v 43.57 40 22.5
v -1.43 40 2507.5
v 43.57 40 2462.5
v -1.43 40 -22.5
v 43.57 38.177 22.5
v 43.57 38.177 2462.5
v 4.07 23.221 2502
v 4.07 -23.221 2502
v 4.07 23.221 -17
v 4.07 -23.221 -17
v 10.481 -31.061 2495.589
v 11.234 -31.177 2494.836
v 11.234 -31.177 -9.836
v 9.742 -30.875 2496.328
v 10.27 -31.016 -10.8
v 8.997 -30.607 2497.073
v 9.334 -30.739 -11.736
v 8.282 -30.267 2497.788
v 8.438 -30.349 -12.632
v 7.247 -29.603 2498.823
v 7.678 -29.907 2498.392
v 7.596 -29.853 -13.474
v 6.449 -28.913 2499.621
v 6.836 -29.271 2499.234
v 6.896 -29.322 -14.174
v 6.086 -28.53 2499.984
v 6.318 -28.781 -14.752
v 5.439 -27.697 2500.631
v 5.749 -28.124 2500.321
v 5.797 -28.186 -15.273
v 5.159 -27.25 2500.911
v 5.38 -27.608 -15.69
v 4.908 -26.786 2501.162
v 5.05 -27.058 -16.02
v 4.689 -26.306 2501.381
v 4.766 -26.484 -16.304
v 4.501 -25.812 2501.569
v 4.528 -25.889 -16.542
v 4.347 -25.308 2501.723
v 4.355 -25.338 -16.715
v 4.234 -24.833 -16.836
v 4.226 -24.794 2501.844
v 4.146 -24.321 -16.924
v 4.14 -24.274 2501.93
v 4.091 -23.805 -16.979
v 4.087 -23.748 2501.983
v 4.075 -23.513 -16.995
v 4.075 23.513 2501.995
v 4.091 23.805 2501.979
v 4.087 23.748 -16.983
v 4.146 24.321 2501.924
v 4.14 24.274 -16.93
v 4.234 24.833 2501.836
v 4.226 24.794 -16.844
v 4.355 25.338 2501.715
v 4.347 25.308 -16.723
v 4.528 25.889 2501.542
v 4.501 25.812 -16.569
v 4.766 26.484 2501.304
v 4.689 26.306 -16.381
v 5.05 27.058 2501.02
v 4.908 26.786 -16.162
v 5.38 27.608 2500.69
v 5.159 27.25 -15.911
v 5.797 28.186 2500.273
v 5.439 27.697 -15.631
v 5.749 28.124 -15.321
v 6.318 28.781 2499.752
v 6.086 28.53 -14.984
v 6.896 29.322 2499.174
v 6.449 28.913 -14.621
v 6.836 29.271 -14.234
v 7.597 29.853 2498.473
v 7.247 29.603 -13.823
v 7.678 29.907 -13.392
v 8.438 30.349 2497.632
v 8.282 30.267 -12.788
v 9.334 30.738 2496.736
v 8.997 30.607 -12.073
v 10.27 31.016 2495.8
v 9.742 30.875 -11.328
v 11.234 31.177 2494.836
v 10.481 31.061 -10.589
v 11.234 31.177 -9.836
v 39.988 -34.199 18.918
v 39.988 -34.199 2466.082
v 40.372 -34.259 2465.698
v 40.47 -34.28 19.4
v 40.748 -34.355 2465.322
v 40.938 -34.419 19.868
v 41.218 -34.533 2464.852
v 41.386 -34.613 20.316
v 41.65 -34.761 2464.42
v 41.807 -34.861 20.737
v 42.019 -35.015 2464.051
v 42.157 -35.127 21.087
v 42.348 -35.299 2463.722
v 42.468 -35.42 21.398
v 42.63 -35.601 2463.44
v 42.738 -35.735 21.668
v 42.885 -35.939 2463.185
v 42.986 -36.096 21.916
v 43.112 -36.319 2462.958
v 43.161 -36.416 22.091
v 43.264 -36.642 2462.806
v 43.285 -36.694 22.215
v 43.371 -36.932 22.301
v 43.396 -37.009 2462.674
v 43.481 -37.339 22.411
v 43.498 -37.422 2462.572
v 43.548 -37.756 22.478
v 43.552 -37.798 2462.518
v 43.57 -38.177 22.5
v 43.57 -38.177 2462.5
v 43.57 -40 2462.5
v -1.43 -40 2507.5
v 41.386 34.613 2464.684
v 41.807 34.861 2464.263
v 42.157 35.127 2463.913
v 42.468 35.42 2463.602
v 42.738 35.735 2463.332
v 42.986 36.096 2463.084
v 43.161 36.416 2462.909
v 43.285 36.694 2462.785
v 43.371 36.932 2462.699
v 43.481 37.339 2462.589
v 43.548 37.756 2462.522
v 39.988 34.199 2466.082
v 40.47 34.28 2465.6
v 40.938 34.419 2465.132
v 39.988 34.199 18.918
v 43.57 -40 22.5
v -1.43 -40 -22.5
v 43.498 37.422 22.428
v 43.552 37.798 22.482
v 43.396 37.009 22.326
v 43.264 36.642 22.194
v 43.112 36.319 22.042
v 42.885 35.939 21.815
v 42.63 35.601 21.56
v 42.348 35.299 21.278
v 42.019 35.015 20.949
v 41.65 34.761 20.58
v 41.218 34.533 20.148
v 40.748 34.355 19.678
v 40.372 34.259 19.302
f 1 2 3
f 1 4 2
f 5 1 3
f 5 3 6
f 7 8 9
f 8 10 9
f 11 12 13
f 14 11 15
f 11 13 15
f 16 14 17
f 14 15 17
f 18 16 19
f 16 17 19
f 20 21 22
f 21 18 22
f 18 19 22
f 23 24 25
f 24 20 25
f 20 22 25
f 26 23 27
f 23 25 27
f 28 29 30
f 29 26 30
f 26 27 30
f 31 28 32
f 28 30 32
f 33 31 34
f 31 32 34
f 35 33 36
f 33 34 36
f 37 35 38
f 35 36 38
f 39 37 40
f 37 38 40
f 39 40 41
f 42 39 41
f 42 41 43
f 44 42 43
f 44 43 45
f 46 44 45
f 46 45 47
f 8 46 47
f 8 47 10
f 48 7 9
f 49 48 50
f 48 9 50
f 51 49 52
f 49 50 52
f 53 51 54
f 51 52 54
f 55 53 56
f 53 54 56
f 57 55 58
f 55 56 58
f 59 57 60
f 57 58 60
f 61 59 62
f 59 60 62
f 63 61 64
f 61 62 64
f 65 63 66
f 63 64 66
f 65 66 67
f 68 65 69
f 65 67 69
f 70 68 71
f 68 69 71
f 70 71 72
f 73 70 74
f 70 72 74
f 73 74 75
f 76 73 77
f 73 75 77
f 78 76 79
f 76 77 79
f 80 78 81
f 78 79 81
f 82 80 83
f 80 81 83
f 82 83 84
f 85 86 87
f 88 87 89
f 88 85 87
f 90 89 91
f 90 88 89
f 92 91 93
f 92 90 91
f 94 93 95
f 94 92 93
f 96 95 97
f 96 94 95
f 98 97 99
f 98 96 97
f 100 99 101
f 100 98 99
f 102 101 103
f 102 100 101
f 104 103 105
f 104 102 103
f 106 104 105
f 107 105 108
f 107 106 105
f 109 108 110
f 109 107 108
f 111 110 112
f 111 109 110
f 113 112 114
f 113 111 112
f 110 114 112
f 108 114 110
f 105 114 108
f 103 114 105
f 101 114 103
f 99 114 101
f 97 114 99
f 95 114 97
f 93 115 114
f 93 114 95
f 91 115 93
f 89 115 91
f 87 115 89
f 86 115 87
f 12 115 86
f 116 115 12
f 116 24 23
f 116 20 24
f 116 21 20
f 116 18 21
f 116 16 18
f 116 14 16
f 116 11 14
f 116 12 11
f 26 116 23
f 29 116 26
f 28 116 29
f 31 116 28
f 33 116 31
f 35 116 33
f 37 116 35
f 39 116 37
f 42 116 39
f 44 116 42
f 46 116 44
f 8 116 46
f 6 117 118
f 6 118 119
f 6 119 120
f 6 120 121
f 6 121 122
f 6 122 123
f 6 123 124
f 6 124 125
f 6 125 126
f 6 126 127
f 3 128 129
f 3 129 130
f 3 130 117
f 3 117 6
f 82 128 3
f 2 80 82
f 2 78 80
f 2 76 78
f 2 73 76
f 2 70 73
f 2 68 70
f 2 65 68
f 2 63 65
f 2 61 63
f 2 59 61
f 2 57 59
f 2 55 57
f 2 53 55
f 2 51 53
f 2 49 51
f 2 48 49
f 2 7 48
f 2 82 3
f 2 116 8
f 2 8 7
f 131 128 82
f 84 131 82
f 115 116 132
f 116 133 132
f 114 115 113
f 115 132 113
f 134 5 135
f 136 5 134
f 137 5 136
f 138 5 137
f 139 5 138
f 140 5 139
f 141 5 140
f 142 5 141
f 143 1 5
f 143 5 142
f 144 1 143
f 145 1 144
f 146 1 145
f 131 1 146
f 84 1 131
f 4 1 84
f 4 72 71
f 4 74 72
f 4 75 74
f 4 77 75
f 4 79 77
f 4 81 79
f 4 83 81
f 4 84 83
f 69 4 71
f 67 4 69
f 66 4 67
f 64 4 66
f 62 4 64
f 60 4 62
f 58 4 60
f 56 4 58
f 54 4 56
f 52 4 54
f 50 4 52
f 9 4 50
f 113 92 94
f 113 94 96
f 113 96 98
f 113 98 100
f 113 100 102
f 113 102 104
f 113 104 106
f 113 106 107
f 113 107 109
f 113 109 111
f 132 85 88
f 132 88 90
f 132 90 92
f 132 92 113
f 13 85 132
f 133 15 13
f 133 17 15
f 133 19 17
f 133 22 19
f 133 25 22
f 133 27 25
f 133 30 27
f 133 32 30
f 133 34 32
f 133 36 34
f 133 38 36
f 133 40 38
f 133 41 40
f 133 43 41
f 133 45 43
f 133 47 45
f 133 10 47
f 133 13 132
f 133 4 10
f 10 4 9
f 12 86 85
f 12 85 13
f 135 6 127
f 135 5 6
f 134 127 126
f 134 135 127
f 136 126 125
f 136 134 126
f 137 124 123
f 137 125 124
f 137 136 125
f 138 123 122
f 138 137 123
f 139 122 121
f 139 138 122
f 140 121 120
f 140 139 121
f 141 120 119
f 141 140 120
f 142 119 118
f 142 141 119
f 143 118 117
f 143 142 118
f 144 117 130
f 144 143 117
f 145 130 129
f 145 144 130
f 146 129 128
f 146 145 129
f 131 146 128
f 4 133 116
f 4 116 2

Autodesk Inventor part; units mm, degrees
ref_plane "Начальная плоскость" through (0, 0, -22.5) normal (0, 0, 1) x (1, 0, 0)
ref_plane "Конечная плоскость" through (0, 0, 2507.5) normal (0, 0, 1) x (1, 0, 0)
sketch "Эскиз" plane through (0, 0, 0) normal (0, 0, 1) x (1, 0, 0)
  line L0 (-1.43, 0) -> (-1.43, 40)
  line L1 (-1.43, 40) -> (43.57, 40)
  line L2 (43.57, 40) -> (43.57, 38.1774)
  line L3 (39.9881, 34.1993) -> (11.2338, 31.1771)
  line L4 (4.07, 23.221) -> (4.07, 0)
  line L5 (4.07, 0) -> (-1.43, 0) construction
  line L6 (23.82, 40) -> (23.82, 32.5) construction
  line L7 (43.57, 34.5758) -> (43.57, 32.5) construction
  line L8 (43.57, 32.5) -> (23.82, 32.5) construction
  line L9 (0, 15) -> (0, -27) construction
  line L10 (-5.539, 0) -> (16.0067, 0) construction
  line L11 (-1.43, 0) -> (-1.43, -40)
  line L12 (-1.43, -40) -> (43.57, -40)
  line L13 (43.57, -40) -> (43.57, -38.1774)
  line L14 (39.9881, -34.1993) -> (11.2338, -31.1771)
  line L15 (4.07, -23.221) -> (4.07, 0)
  arc A0 (11.2338, 31.1771) -> (4.07, 23.221) centre (12.07, 23.221) ccw
  arc A1 (4.07, -23.221) -> (11.2338, -31.1771) centre (12.07, -23.221) ccw
  arc A2 (39.9881, 34.1993) -> (43.57, 38.1774) centre (39.57, 38.1774) ccw
  arc A3 (43.57, -38.1774) -> (39.9881, -34.1993) centre (39.57, -38.1774) ccw
  line L16 (0, 56) -> (0, -56) construction
  line L17 (-15.5135, 0) -> (54.308, 0) construction
  point P0 (4.07, 30.4242)
  point P1 (43.57, -34.5758)
  point P2 (4.07, -30.4242)
  point P3 (23.82, -40)
  point P4 (23.82, -32.5)
  dimension "d0" = 5.5
  dimension "d1" = 40
  dimension "d2" = 45
  dimension "d3" = 7.5
  dimension "d4" = 19.75
  dimension "d5" = 2.0758
  dimension "d23" = 8
  dimension "d24" = 4
  dimension "d25" = 1.43
extrude "Тело" add sketch "Эскиз" along normal up to surface (2530 mm away) from surface at -22.5
sketch "Sketch3" plane through (0, 0, 0) normal (0, 0, 1) x (1, 0, 0)
  line L0 (0, 0) -> (10, 0)
ref_plane "Work Plane3" through (0, 0, 0) normal (0, -1, 0) x (1, 0, 0)
sketch "Sketch4" plane through (0, 0, 0) normal (0, -1, 0) x (1, 0, 0)
  line L0 (-2, -22.5) -> (12, -22.5)
  line L1 (-2, 2507.5) -> (12, 2507.5)
  dimension "d29" = 2530
ref_plane "РабПлоскость4" through (-1.43, 0, -22.5) normal (0.7071, 0, -0.7071) x (-0.7071, 0, -0.7071)
split "Разделение1" plane through (-1.43, 0, -22.5) removes the side toward (0.7071, 0, -0.7071)
ref_plane "РабПлоскость5" through (-1.43, 0, 2507.5) normal (0.7071, 0, 0.7071) x (0.7071, 0, -0.7071)
split "Разделение2" plane through (-1.43, 0, 2507.5) removes the side toward (0.7071, 0, 0.7071)
equation "\"d0\" = G_T"
equation "\"d1\" = 0.5 * G_H"
equation "\"d2\" = G_W"
equation "\"d3\" = G_T1"
equation "\"d4\" = G_C"
equation "\"d23\" = G_IR"
equation "\"d24\" = G_ER"
equation "\"d25\" = ex"
equation "\"d6\" = G_L"
equation "\"G_W\" = 45"
equation "\"G_T\" = 5.5"
equation "\"G_T1\" = 7.5"
equation "\"G_NG\" = 0.105104"
equation "\"G_ER\" = 4"
equation "\"G_IR\" = 8"
equation "\"G_C\" = 19.75"
equation "\"G_L\" = d29"
equation "\"ex\" = 1.43"
equation "\"G_OFFSET_START\" = 22.5"
equation "\"G_OFFSET_END\" = 22.5"
equation "\"d26\" = -G_OFFSET_START"
equation "\"d27\" = G_OFFSET_END + B_L"
equation "\"B_L\" = 2485"
equation "\"G_H\" = 80"
properties part number "ISO 657/11 - CH 80 x 8 - 2530" material "Сталь нержавеющая, 440C"
